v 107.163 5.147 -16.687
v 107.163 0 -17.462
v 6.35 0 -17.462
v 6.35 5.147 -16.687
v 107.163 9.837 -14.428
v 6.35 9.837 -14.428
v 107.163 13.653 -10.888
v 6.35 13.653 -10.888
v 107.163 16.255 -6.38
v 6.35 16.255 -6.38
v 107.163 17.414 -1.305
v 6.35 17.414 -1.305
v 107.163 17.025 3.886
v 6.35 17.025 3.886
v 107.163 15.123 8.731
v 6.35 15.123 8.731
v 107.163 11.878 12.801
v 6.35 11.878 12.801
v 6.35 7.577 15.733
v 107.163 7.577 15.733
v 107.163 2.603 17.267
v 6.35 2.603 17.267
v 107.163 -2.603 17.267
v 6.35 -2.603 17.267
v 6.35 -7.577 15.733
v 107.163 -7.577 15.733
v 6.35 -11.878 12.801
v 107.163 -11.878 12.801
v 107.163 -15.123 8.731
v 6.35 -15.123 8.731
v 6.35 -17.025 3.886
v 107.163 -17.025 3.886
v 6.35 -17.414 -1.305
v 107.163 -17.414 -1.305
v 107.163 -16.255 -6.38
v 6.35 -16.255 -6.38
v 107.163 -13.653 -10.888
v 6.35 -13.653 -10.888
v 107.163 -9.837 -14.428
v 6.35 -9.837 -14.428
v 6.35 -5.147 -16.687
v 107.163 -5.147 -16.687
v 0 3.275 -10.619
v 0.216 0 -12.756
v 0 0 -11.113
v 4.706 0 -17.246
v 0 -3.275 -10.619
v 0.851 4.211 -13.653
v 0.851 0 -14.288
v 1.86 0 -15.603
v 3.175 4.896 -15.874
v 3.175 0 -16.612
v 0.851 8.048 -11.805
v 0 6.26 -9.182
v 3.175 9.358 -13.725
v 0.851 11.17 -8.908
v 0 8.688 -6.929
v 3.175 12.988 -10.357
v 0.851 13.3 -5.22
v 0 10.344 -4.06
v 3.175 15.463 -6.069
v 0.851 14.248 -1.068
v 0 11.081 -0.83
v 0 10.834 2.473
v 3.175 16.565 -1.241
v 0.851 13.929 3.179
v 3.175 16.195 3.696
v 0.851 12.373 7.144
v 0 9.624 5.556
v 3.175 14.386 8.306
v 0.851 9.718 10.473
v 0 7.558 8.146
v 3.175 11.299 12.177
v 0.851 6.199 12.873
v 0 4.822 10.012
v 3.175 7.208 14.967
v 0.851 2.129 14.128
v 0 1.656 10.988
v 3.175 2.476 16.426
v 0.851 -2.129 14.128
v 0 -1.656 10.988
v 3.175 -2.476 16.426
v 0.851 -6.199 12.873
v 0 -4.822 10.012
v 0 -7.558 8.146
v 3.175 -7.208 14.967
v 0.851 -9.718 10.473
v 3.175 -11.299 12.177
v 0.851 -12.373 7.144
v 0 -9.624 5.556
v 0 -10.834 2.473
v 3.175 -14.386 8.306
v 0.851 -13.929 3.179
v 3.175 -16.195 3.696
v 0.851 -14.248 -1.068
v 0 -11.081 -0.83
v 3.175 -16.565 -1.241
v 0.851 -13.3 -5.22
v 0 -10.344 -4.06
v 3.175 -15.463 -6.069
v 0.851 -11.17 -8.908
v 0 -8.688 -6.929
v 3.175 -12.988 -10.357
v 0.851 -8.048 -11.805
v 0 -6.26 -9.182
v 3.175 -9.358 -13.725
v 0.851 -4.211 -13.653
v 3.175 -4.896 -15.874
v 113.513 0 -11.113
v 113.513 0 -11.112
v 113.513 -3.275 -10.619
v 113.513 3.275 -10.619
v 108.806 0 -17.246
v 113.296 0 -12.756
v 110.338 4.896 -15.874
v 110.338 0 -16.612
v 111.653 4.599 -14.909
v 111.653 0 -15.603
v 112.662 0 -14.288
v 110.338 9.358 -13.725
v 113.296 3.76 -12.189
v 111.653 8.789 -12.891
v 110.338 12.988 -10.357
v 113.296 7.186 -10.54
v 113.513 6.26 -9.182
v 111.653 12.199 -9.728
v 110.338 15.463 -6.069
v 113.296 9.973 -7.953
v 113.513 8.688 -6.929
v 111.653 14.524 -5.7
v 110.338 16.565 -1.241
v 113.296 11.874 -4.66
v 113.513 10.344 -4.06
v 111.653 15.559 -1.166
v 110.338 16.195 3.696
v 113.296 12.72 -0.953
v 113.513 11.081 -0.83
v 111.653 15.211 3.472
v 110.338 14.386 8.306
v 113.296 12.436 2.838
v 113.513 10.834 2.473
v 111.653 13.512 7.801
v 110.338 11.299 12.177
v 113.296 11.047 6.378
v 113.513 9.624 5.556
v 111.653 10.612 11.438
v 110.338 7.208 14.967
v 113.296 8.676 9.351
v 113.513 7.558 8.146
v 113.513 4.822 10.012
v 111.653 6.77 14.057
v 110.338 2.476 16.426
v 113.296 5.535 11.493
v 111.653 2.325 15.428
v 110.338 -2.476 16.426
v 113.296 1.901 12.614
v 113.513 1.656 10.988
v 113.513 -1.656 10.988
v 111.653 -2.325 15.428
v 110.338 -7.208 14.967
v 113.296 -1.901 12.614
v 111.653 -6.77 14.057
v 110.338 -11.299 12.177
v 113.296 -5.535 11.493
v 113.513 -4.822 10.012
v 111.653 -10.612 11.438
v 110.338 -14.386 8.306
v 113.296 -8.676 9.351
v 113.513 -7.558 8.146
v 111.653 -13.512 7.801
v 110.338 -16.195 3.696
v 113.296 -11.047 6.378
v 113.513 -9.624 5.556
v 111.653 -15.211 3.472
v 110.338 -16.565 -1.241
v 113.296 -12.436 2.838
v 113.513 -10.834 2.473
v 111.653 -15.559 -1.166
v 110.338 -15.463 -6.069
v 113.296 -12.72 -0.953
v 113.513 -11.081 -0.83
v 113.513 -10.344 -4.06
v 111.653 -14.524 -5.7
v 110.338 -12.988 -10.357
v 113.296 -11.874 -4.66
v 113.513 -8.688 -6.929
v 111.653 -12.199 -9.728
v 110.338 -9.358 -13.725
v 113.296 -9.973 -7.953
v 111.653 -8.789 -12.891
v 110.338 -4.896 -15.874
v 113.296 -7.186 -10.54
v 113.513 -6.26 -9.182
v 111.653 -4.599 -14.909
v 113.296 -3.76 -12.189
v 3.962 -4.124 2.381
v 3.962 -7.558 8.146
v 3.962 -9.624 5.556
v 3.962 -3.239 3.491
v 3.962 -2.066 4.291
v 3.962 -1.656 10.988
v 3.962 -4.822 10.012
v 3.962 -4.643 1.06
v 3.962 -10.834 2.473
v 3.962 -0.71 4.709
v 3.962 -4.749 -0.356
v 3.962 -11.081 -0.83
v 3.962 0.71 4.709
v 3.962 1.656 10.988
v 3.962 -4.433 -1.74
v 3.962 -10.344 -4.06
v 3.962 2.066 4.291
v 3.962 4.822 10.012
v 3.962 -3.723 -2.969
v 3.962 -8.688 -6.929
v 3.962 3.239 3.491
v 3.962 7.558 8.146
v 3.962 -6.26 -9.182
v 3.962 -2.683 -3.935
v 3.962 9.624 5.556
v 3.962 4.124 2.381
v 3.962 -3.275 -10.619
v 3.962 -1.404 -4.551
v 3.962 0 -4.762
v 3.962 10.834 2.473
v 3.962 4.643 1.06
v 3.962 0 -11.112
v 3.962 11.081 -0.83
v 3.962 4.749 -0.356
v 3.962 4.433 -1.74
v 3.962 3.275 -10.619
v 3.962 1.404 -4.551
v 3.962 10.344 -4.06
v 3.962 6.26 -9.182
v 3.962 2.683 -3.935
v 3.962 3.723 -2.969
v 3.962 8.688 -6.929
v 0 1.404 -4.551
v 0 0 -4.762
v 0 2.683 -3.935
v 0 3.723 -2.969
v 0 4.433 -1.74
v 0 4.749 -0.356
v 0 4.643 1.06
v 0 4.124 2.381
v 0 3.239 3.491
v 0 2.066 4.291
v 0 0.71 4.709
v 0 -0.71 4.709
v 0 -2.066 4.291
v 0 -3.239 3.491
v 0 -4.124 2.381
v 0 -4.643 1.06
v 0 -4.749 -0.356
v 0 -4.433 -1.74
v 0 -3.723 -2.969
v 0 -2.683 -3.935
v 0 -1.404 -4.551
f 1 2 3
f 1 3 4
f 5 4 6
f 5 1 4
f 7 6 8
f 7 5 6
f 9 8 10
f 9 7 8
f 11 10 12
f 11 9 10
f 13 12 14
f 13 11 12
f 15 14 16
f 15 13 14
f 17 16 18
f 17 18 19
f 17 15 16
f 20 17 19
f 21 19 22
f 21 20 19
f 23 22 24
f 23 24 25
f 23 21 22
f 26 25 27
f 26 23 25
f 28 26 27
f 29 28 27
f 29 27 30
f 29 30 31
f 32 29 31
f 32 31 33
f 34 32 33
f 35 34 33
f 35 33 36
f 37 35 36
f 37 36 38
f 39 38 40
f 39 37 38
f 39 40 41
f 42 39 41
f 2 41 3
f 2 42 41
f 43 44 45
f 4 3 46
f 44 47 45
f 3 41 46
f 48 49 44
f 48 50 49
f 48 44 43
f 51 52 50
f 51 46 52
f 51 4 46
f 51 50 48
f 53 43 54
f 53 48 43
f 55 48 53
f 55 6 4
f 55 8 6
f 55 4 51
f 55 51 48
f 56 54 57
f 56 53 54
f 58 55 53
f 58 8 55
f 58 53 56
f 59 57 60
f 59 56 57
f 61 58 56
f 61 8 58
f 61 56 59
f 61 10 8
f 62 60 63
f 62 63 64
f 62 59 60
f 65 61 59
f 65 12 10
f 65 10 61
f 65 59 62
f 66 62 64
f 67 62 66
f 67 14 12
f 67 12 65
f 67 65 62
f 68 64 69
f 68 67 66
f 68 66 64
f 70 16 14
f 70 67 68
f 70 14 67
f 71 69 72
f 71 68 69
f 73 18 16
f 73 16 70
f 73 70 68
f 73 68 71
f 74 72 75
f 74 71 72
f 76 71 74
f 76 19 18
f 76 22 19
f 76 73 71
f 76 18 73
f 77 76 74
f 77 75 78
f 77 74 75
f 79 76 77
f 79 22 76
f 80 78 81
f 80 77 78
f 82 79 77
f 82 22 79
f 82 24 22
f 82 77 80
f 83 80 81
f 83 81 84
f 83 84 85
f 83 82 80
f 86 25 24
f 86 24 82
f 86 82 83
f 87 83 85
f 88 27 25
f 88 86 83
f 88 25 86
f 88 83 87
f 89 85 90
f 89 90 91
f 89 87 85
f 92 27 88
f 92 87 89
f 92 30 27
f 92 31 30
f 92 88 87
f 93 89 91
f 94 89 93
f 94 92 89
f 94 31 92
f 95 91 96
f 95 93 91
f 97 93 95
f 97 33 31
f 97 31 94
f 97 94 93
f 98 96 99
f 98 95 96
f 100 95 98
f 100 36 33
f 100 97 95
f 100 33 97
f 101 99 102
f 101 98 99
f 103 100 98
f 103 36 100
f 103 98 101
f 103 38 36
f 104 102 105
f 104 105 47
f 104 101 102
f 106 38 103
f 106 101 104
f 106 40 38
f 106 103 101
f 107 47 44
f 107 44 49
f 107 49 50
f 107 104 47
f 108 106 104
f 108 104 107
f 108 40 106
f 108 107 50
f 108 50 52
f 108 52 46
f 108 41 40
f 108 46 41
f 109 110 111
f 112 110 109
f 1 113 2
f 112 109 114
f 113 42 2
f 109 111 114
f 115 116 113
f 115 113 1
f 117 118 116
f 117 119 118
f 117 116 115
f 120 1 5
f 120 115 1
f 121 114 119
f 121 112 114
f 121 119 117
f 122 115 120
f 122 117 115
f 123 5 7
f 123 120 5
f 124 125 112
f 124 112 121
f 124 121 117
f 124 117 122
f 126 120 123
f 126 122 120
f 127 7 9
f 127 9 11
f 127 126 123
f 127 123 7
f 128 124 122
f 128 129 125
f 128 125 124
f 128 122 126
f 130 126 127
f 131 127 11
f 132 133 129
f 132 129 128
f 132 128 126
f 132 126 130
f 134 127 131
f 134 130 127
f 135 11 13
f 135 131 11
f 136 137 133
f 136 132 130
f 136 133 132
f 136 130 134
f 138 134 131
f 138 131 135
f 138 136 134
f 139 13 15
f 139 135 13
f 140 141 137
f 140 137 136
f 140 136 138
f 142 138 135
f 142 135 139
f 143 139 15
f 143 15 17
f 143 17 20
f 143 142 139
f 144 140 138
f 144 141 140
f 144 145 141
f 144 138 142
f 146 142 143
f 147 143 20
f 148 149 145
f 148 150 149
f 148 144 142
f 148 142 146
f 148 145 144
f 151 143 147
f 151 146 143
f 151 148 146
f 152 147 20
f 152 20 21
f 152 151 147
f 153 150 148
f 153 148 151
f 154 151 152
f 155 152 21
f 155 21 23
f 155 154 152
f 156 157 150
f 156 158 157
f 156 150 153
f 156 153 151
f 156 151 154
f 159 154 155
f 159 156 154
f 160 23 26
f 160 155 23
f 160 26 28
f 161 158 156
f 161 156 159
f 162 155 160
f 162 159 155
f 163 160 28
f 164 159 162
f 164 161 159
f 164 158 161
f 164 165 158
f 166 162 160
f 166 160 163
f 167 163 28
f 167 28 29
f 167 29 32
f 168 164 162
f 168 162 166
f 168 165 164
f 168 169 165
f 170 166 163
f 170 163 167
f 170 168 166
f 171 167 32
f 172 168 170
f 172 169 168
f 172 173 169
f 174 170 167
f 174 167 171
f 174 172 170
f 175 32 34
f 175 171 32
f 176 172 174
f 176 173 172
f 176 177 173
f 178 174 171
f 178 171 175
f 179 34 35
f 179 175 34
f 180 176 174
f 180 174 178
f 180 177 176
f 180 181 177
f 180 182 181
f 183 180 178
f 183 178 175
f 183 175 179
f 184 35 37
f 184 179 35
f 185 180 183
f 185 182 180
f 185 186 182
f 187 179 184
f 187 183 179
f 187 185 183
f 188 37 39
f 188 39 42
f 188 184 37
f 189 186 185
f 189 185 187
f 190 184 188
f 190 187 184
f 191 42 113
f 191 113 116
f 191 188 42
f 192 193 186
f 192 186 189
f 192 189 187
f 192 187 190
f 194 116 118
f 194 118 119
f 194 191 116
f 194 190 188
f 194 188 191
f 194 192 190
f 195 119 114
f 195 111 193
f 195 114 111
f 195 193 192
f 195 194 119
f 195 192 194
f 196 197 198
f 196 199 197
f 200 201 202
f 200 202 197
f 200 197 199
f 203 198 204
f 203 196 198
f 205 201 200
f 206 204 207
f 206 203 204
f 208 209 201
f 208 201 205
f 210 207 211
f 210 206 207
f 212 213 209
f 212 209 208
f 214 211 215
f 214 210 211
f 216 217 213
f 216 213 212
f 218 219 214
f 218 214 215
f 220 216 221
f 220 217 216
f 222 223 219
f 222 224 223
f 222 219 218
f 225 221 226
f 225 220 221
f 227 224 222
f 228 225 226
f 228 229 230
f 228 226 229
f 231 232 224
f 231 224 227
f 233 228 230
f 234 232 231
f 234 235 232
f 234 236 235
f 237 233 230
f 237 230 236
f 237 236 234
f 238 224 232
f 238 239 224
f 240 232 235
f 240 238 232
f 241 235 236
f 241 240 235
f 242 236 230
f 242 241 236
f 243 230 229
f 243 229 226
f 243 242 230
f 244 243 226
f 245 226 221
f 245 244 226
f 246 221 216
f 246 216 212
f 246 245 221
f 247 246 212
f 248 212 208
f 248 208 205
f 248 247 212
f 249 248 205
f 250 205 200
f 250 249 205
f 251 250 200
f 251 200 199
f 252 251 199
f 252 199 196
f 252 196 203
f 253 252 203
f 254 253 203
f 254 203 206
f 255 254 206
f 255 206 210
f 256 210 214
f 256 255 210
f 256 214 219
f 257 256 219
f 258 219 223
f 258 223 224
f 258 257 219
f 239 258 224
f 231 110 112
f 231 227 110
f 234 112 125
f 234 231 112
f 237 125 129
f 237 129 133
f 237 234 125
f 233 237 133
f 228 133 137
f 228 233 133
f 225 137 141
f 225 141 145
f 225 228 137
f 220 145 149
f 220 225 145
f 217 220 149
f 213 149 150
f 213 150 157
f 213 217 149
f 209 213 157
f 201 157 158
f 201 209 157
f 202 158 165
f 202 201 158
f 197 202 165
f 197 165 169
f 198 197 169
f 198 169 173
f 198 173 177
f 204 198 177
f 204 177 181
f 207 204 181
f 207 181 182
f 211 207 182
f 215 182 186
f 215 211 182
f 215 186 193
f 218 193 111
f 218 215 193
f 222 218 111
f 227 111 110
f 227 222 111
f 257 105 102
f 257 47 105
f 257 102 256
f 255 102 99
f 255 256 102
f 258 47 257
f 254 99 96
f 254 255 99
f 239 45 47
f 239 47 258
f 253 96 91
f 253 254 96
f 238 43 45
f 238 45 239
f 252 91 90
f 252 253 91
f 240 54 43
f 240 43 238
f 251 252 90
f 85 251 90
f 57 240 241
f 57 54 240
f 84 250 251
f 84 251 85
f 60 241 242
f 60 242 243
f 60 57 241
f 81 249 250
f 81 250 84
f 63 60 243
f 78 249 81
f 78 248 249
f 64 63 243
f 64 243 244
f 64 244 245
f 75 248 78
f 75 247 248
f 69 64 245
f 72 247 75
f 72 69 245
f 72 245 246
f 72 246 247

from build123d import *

# Parameters (mm, degrees)
F2_R = 6.34999


# Not quite as in the source:
# - a fillet or chamfer is up to 0.001 mm smaller than in the source, because OpenCascade refuses the exact size


with BuildPart() as f1:
    # F0 (on Front) → F1 (revolve)
    with BuildSketch(Plane.XZ):
        Polygon((3.9624, -4.7625), (0, -4.7625), (0, -17.4625), (113.5126, -17.4625), (113.5126, -11.1125), (3.9624, -11.1125), align=None)
    revolve(axis=Axis((63.5, 0, 0), (1, 0, 0)))

    # F2 (radius 6.35 in the source; OpenCascade refuses exactly that, so slightly less here)
    f2_edges = [f1.edges().sort_by_distance(p)[0] for p in [
        (0, 0, 17.4625),
        (113.5126, 0, 17.4625),
    ]]
    fillet(f2_edges, radius=F2_R)


solid = f1.part
